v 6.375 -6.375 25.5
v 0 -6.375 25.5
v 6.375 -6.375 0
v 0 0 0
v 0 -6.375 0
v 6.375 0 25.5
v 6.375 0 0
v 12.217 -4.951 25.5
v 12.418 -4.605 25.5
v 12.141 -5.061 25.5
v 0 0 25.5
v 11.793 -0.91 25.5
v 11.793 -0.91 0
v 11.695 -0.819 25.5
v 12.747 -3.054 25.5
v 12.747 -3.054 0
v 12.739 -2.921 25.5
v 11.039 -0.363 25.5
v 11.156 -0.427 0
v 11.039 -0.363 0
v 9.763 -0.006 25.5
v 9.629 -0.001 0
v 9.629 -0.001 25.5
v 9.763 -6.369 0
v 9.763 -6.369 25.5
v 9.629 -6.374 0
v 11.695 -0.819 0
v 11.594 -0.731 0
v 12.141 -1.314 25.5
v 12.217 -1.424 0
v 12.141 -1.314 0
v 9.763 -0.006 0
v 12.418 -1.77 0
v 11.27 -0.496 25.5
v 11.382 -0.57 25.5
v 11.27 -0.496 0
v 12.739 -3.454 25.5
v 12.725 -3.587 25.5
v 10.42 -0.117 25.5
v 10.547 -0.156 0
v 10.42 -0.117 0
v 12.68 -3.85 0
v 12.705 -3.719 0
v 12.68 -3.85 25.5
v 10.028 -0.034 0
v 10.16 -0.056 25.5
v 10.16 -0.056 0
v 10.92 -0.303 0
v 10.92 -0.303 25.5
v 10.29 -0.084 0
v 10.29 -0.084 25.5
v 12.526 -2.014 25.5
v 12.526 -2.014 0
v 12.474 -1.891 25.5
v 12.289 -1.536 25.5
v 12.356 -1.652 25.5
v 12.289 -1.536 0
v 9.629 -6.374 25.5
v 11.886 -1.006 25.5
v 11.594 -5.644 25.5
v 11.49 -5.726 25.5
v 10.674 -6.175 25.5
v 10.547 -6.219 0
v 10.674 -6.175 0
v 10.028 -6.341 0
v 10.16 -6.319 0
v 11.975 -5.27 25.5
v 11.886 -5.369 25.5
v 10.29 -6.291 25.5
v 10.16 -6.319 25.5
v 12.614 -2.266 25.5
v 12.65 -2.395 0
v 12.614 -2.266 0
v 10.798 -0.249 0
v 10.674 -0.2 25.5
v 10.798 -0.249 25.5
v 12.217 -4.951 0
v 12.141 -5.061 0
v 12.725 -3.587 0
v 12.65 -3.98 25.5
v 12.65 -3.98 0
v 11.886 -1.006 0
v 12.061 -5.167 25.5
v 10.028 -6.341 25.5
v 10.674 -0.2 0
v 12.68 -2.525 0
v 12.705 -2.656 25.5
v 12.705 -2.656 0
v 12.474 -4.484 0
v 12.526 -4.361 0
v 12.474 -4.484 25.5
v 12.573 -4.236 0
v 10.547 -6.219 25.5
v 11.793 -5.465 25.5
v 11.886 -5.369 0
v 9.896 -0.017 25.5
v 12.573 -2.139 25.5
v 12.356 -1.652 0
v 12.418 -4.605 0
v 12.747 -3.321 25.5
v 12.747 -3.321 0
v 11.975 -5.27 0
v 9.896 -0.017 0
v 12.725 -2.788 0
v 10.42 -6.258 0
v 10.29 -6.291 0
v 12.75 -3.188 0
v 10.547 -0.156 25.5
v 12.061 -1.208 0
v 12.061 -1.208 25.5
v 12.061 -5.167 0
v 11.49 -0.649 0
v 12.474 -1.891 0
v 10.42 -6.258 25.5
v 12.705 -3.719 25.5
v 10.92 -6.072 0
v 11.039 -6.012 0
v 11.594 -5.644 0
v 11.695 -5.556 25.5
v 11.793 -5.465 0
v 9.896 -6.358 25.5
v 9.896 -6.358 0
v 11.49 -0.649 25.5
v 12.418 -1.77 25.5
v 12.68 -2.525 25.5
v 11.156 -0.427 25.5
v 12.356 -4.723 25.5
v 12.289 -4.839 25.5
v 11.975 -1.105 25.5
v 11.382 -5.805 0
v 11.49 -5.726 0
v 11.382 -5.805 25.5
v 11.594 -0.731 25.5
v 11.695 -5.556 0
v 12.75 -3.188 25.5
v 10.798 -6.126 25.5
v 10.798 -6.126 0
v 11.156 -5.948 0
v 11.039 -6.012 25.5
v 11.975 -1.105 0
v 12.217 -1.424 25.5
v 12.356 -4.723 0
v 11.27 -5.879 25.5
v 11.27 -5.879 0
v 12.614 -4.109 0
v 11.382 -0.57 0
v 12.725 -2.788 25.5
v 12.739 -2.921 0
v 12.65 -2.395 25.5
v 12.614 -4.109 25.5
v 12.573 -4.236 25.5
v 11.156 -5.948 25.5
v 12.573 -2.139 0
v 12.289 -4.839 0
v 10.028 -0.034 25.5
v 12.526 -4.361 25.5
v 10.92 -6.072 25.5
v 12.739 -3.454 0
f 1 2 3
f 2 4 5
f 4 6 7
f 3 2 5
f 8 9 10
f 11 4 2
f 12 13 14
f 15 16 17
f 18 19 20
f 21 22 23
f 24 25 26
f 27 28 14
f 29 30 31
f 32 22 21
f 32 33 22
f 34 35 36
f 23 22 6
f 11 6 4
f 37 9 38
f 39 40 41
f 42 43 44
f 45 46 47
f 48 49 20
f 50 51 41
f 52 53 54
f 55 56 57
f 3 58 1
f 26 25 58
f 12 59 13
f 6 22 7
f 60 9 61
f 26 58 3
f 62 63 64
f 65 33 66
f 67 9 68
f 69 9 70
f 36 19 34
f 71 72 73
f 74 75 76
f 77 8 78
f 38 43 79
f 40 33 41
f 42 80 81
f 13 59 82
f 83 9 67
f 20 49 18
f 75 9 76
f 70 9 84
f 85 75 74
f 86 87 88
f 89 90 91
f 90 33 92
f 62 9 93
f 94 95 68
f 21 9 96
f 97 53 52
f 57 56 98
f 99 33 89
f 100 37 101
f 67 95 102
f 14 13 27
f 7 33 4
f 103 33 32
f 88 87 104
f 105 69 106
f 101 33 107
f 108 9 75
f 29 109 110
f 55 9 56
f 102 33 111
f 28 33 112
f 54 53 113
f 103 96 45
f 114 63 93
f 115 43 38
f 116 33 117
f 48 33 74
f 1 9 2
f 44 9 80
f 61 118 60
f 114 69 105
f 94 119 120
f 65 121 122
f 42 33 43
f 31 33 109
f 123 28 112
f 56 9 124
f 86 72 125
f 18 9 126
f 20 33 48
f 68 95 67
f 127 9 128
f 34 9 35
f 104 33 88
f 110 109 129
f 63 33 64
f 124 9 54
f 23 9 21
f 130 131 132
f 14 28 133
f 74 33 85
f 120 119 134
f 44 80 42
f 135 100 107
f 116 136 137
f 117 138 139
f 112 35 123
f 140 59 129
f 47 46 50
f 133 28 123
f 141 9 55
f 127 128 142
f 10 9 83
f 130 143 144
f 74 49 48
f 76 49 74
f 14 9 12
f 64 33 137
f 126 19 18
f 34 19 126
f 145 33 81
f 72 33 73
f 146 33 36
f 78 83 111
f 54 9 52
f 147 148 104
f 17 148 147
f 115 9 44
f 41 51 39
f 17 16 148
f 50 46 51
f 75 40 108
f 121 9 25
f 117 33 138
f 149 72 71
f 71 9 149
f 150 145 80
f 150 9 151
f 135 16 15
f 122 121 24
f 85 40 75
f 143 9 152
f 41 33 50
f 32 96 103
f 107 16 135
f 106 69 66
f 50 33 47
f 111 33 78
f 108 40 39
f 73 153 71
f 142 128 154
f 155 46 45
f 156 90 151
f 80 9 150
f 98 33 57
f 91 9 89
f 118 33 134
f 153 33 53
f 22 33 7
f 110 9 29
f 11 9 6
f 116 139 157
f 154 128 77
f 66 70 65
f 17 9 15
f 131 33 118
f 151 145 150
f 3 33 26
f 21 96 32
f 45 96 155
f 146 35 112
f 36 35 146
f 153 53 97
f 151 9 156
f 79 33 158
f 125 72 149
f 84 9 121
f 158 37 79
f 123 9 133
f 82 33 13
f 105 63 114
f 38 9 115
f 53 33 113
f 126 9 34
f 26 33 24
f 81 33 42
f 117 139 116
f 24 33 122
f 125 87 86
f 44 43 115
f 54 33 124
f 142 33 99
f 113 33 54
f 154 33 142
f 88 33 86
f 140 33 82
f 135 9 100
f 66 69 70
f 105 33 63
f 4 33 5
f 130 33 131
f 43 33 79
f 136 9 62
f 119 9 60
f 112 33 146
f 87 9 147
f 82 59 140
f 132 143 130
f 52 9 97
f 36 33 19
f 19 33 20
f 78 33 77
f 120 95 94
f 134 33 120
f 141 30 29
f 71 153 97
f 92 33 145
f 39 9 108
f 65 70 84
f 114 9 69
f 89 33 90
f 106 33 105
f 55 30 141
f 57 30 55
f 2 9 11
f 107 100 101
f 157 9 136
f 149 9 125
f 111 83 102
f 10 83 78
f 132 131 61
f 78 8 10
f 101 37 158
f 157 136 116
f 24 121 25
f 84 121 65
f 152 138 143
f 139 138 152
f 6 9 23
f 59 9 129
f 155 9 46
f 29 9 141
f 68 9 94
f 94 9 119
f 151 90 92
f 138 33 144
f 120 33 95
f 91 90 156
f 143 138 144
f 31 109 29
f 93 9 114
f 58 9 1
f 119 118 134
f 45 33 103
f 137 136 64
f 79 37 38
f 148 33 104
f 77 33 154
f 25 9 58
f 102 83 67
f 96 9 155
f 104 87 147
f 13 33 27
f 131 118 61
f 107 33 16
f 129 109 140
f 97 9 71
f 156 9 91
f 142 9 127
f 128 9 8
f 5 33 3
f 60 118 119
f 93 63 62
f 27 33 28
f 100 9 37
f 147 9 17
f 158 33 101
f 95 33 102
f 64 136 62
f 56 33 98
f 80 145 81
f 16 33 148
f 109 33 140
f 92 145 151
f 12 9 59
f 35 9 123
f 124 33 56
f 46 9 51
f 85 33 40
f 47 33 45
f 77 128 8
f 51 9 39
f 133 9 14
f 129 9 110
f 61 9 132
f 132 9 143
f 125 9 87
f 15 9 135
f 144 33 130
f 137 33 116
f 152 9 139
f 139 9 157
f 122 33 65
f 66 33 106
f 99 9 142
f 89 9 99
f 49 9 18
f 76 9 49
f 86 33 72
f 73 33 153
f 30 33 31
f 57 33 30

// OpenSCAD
$fn = 150;

rotate(a = [90, 0, 0]) {
	hull() {
		cube(size = [6.375, 25.5, 6.375]);
		translate(v = [9.5625, 0, 3.1875]) {
			rotate(a = [-90, 0, 0]) {
				cylinder(d = 6.375, h = 25.5);
			}
		}
	}
}
